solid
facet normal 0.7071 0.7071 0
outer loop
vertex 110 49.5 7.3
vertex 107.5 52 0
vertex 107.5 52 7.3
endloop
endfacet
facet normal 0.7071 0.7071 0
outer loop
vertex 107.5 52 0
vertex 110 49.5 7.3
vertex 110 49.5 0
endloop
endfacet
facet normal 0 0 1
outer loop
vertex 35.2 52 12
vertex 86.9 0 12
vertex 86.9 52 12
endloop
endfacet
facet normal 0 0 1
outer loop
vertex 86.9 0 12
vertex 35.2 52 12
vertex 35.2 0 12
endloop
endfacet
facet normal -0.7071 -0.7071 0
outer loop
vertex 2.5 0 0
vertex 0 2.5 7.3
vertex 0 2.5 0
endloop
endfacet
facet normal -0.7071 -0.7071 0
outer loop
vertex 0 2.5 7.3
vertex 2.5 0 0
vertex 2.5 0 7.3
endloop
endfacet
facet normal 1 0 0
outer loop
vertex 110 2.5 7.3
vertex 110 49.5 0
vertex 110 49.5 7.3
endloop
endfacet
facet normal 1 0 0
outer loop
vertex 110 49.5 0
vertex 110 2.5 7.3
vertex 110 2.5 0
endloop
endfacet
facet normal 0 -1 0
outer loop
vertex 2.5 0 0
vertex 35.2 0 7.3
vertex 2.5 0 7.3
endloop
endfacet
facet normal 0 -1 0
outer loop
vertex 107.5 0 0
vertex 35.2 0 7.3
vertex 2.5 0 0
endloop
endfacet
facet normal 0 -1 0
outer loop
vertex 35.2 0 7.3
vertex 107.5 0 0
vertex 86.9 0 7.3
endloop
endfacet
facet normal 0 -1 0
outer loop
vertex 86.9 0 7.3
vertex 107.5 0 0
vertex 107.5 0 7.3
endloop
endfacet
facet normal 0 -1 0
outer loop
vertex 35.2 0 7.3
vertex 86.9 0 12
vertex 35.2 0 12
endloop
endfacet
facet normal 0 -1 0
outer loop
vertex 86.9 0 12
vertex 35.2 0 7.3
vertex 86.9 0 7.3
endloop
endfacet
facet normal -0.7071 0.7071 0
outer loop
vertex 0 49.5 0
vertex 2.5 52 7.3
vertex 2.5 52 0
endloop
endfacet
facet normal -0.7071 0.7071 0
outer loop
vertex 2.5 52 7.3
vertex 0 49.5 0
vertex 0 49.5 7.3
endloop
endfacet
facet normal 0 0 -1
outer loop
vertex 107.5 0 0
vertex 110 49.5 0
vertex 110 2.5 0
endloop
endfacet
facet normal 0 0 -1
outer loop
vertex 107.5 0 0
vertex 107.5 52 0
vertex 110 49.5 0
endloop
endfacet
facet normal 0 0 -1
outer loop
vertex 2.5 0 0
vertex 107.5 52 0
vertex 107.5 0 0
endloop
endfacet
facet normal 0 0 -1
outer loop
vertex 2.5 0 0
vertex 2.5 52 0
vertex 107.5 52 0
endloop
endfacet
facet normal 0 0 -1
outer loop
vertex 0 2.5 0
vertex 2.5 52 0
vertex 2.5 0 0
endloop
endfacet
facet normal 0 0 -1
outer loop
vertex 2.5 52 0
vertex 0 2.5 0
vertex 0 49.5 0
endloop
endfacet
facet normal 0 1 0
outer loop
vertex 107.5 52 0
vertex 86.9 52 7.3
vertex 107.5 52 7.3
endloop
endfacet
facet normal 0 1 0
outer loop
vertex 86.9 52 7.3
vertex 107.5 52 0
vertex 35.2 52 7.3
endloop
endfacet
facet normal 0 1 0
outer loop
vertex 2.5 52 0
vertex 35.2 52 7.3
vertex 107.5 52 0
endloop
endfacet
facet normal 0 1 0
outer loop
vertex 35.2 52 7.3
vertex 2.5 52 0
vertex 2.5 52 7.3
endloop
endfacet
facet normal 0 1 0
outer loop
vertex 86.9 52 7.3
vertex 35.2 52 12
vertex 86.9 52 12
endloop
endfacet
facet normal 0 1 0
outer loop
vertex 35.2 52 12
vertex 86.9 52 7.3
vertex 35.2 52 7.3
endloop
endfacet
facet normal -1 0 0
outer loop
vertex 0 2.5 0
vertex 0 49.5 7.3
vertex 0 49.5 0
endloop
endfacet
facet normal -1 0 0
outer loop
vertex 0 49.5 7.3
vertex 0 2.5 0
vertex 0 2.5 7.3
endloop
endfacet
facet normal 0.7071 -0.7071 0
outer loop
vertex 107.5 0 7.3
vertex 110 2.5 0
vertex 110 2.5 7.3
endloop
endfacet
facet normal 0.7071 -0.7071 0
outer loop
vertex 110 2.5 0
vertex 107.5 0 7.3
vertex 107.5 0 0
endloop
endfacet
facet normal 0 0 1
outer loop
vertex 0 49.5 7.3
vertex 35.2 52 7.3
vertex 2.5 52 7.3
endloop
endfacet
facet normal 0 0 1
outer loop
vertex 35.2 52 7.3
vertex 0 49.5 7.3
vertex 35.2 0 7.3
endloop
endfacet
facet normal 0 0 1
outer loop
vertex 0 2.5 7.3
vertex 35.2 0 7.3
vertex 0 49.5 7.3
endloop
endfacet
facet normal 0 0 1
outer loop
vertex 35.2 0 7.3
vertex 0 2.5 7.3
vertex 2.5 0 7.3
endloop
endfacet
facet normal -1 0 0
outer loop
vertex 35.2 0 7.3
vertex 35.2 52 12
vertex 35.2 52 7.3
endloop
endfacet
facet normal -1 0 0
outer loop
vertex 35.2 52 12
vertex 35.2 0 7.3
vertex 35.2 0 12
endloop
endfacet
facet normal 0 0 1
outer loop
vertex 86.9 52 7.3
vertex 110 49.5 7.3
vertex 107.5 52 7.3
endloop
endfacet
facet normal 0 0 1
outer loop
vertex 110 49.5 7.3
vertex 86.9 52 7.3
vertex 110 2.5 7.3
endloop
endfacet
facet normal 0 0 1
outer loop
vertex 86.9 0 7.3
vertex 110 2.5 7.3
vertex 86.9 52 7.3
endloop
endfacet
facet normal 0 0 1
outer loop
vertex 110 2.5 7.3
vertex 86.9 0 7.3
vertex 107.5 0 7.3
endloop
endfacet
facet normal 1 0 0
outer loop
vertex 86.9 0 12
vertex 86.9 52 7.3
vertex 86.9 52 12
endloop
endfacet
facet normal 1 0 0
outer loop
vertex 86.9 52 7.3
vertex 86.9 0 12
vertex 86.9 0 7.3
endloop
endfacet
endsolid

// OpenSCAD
$fn = 32;

// ----------------------------------------------------------------------
// Stepped bar: centerstep, 110 x 52 x 12/7.3 mm
// ----------------------------------------------------------------------

// --- parameters (mm) ---
bar_l = 110;              // bar length, X
bar_w = 52;               // bar width, Y
plate_t = 12;             // thickness of the thick zone, Z
thin_t = 7.3;             // thickness of the thin zone
corner_c = 2.5;           // corner chamfer of the bar
step_cut = 4.7;           // material removed from the thin zone
thick_from = 35.2;        // start of the thick middle zone
thick_to = 86.9;          // end of the thick middle zone
depth_1 = 4.7;            // depth of cut 1 from the top face
depth_2 = 4.7;            // depth of cut 2 from the top face

profile = [[2.5, 0], [107.5, 0], [110, 2.5], [110, 49.5], [107.5, 52], [2.5, 52], [0, 49.5], [0, 2.5]];  // primary outline, 8 points, counter clockwise
void_1 = [[-1, -1], [35.2, -1], [35.2, 53], [-1, 53]];  // thin left end, 4 points
void_2 = [[86.9, -1], [111, -1], [111, 53], [86.9, 53]];  // thin right end, 4 points

// --- the one profile operation ---
difference() {
  linear_extrude(height = plate_t) polygon(points = profile);
  translate([0, 0, plate_t - depth_1])
    linear_extrude(height = depth_1 + 1) polygon(points = void_1);
  translate([0, 0, plate_t - depth_2])
    linear_extrude(height = depth_2 + 1) polygon(points = void_2);
}
